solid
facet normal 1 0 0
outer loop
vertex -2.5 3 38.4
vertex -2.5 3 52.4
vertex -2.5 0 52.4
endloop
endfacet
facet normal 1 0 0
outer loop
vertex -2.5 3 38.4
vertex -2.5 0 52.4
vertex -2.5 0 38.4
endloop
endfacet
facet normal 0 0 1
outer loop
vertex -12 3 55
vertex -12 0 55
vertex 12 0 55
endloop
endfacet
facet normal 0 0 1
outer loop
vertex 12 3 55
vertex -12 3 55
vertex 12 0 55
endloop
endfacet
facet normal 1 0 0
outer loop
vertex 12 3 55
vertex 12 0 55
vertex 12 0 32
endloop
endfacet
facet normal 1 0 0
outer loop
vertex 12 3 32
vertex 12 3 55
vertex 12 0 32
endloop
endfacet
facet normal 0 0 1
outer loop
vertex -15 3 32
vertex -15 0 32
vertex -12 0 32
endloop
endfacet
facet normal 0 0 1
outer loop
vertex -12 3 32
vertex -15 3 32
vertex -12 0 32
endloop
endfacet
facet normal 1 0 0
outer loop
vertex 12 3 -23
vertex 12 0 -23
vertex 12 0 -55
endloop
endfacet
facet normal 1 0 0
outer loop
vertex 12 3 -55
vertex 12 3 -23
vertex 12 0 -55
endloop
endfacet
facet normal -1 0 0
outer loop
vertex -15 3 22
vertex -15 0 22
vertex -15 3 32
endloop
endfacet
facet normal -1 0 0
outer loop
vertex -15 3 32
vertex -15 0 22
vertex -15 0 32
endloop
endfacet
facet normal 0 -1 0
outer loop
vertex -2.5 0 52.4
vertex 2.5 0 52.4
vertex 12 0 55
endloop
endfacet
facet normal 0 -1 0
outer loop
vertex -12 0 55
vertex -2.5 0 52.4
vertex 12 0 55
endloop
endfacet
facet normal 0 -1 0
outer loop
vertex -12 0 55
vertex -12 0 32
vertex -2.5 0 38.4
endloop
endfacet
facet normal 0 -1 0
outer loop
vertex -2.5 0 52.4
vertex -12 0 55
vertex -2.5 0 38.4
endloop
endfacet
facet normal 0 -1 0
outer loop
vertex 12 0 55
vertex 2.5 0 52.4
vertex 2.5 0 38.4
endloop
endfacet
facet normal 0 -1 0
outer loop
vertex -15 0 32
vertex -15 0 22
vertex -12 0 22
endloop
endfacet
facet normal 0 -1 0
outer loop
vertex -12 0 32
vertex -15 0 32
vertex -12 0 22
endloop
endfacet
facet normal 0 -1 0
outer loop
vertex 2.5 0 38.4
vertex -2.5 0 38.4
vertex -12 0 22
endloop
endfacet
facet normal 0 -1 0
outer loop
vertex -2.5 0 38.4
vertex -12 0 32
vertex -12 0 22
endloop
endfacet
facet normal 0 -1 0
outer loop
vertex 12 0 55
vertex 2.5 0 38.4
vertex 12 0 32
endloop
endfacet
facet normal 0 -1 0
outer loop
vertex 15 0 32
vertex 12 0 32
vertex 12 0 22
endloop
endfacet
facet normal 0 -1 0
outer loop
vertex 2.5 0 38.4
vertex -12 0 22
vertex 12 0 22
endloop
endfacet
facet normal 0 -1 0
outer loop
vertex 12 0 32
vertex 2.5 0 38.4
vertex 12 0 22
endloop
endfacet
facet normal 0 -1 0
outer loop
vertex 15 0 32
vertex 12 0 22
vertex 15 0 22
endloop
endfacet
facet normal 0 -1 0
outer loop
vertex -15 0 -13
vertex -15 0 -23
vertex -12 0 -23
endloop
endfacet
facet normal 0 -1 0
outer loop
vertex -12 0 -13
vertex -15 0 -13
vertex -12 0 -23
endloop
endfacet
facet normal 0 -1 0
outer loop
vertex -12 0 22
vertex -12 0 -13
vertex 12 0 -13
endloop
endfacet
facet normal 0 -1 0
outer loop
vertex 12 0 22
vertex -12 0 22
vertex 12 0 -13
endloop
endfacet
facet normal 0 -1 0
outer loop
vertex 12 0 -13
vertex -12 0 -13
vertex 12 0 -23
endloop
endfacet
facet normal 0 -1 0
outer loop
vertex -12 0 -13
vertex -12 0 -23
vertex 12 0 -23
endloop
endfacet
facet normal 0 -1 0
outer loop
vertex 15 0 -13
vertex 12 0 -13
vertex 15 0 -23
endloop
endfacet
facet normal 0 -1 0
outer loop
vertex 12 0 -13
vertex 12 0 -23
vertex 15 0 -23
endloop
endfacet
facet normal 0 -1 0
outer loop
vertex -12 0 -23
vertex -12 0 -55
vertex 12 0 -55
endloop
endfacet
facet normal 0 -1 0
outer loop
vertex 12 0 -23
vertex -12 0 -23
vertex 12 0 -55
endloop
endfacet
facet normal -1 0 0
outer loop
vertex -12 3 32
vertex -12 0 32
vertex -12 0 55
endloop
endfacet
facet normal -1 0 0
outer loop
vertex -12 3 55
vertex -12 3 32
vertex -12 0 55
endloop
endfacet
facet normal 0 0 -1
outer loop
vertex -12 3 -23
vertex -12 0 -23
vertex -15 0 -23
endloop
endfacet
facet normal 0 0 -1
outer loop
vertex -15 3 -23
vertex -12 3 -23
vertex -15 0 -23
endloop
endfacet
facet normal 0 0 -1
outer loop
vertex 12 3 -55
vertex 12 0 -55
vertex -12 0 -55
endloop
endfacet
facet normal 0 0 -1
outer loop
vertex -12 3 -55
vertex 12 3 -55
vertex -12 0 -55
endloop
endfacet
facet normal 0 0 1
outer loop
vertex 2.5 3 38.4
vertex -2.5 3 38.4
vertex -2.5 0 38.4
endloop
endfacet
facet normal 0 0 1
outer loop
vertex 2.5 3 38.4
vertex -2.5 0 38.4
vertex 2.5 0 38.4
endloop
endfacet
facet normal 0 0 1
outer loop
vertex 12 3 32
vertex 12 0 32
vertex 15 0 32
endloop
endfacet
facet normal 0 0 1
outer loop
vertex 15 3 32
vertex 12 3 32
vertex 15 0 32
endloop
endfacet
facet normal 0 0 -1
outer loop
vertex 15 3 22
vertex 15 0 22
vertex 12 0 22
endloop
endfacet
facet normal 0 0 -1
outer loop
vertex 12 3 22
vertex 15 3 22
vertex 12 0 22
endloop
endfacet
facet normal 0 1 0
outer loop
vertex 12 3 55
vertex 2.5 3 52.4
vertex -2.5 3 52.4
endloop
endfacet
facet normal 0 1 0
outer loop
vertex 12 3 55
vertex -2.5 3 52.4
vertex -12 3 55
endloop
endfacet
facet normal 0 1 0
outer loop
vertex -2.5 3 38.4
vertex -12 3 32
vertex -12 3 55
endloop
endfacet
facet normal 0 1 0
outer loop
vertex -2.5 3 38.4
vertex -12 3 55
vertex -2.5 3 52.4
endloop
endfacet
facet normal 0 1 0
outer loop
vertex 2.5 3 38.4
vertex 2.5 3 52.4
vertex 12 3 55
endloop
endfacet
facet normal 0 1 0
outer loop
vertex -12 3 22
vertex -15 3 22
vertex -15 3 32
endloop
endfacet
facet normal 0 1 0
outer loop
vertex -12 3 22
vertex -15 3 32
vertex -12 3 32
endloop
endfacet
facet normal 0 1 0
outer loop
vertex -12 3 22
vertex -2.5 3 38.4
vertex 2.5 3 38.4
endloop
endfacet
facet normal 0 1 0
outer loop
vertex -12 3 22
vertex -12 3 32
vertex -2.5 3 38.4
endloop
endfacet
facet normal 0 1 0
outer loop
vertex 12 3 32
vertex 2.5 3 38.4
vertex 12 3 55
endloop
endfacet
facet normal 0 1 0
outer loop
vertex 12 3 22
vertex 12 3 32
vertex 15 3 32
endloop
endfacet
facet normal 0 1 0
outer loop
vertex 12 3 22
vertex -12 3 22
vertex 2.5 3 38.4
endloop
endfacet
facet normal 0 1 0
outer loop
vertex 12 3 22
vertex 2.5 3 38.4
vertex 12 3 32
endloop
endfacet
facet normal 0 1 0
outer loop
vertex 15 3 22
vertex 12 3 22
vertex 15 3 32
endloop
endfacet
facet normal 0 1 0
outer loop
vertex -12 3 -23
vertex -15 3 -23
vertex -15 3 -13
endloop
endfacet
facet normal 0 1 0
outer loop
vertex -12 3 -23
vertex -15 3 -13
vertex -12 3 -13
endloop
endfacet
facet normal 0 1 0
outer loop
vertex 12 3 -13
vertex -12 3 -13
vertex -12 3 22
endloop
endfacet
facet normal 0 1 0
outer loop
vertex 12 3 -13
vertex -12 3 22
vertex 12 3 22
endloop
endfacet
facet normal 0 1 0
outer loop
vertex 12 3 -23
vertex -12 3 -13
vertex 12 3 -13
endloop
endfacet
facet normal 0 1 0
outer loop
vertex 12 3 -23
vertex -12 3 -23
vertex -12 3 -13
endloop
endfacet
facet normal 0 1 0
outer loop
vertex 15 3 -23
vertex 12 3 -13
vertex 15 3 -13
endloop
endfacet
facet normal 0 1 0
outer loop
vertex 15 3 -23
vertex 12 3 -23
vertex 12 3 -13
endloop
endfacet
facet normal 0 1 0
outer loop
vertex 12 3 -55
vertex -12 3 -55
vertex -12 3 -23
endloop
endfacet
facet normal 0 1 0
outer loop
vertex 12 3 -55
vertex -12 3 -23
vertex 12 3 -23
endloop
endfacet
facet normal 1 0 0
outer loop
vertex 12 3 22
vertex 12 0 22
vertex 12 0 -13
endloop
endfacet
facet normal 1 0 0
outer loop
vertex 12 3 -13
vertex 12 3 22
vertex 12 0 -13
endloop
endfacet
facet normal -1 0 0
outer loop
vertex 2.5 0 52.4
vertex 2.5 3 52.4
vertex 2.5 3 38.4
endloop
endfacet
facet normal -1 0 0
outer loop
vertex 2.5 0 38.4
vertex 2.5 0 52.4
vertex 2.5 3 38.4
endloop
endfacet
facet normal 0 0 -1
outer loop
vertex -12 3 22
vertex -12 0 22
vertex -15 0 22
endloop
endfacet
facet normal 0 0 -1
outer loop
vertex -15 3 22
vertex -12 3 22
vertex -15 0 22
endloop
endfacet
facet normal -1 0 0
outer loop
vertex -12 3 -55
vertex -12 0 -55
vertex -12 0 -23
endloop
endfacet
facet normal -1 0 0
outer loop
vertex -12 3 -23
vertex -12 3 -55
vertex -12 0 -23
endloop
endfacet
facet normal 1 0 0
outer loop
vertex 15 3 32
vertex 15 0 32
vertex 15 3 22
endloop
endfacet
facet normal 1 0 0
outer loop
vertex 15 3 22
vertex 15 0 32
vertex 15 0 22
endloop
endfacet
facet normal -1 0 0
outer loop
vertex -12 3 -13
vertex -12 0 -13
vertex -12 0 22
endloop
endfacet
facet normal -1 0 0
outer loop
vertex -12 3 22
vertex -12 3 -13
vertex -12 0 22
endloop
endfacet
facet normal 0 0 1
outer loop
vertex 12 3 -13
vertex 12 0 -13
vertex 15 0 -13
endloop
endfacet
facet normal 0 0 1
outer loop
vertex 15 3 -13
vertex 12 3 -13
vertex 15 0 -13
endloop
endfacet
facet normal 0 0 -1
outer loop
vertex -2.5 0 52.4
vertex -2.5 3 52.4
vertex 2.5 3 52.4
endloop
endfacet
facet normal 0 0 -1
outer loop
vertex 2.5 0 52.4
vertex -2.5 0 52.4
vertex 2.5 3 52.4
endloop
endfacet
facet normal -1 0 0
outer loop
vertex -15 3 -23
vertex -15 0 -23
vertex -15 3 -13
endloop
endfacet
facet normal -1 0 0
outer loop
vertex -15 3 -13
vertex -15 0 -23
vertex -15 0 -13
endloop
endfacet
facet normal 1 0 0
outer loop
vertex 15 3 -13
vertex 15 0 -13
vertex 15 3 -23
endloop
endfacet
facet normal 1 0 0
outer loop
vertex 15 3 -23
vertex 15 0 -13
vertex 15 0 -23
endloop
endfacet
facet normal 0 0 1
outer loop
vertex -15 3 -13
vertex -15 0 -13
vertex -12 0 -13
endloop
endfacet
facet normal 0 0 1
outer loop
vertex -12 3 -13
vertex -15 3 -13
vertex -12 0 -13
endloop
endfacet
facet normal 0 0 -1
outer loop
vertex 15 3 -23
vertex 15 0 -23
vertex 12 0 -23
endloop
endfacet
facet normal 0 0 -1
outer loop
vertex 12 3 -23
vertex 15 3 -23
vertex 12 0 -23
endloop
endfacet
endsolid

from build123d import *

# Parameters (mm, degrees)
EXTRUDE_1_DEPTH     = 3
SKETCH_2_W          = 5
SKETCH_2_H          = 14
CUT_EXTRUDE_1_DEPTH = 10


with BuildPart() as part:
    # Эскиз1 → Бобышка-Вытянуть1 (new body)
    with BuildSketch(Plane(origin=(0, 0, 0), x_dir=(1, 0, 0), z_dir=(0, 1, 0))):
        Polygon((-12, -55), (12, -55), (12, -32), (15, -32), (15, -22), (12, -22), (12, 13), (15, 13), (15, 23), (12, 23), (12, 55), (-12, 55), (-12, 23), (-15, 23), (-15, 13), (-12, 13), (-12, -22), (-15, -22), (-15, -32), (-12, -32), align=None)
    extrude(amount=EXTRUDE_1_DEPTH)

    # Эскиз2 → Вырез-Вытянуть1 (cut)
    with BuildSketch(Plane(origin=(0, 3, 0), x_dir=(1, 0, 0), z_dir=(0, 1, 0))):
        with Locations((0, -45.4)):
            Rectangle(SKETCH_2_W, SKETCH_2_H)
    extrude(amount=-CUT_EXTRUDE_1_DEPTH, mode=Mode.SUBTRACT)


solid = part.part
